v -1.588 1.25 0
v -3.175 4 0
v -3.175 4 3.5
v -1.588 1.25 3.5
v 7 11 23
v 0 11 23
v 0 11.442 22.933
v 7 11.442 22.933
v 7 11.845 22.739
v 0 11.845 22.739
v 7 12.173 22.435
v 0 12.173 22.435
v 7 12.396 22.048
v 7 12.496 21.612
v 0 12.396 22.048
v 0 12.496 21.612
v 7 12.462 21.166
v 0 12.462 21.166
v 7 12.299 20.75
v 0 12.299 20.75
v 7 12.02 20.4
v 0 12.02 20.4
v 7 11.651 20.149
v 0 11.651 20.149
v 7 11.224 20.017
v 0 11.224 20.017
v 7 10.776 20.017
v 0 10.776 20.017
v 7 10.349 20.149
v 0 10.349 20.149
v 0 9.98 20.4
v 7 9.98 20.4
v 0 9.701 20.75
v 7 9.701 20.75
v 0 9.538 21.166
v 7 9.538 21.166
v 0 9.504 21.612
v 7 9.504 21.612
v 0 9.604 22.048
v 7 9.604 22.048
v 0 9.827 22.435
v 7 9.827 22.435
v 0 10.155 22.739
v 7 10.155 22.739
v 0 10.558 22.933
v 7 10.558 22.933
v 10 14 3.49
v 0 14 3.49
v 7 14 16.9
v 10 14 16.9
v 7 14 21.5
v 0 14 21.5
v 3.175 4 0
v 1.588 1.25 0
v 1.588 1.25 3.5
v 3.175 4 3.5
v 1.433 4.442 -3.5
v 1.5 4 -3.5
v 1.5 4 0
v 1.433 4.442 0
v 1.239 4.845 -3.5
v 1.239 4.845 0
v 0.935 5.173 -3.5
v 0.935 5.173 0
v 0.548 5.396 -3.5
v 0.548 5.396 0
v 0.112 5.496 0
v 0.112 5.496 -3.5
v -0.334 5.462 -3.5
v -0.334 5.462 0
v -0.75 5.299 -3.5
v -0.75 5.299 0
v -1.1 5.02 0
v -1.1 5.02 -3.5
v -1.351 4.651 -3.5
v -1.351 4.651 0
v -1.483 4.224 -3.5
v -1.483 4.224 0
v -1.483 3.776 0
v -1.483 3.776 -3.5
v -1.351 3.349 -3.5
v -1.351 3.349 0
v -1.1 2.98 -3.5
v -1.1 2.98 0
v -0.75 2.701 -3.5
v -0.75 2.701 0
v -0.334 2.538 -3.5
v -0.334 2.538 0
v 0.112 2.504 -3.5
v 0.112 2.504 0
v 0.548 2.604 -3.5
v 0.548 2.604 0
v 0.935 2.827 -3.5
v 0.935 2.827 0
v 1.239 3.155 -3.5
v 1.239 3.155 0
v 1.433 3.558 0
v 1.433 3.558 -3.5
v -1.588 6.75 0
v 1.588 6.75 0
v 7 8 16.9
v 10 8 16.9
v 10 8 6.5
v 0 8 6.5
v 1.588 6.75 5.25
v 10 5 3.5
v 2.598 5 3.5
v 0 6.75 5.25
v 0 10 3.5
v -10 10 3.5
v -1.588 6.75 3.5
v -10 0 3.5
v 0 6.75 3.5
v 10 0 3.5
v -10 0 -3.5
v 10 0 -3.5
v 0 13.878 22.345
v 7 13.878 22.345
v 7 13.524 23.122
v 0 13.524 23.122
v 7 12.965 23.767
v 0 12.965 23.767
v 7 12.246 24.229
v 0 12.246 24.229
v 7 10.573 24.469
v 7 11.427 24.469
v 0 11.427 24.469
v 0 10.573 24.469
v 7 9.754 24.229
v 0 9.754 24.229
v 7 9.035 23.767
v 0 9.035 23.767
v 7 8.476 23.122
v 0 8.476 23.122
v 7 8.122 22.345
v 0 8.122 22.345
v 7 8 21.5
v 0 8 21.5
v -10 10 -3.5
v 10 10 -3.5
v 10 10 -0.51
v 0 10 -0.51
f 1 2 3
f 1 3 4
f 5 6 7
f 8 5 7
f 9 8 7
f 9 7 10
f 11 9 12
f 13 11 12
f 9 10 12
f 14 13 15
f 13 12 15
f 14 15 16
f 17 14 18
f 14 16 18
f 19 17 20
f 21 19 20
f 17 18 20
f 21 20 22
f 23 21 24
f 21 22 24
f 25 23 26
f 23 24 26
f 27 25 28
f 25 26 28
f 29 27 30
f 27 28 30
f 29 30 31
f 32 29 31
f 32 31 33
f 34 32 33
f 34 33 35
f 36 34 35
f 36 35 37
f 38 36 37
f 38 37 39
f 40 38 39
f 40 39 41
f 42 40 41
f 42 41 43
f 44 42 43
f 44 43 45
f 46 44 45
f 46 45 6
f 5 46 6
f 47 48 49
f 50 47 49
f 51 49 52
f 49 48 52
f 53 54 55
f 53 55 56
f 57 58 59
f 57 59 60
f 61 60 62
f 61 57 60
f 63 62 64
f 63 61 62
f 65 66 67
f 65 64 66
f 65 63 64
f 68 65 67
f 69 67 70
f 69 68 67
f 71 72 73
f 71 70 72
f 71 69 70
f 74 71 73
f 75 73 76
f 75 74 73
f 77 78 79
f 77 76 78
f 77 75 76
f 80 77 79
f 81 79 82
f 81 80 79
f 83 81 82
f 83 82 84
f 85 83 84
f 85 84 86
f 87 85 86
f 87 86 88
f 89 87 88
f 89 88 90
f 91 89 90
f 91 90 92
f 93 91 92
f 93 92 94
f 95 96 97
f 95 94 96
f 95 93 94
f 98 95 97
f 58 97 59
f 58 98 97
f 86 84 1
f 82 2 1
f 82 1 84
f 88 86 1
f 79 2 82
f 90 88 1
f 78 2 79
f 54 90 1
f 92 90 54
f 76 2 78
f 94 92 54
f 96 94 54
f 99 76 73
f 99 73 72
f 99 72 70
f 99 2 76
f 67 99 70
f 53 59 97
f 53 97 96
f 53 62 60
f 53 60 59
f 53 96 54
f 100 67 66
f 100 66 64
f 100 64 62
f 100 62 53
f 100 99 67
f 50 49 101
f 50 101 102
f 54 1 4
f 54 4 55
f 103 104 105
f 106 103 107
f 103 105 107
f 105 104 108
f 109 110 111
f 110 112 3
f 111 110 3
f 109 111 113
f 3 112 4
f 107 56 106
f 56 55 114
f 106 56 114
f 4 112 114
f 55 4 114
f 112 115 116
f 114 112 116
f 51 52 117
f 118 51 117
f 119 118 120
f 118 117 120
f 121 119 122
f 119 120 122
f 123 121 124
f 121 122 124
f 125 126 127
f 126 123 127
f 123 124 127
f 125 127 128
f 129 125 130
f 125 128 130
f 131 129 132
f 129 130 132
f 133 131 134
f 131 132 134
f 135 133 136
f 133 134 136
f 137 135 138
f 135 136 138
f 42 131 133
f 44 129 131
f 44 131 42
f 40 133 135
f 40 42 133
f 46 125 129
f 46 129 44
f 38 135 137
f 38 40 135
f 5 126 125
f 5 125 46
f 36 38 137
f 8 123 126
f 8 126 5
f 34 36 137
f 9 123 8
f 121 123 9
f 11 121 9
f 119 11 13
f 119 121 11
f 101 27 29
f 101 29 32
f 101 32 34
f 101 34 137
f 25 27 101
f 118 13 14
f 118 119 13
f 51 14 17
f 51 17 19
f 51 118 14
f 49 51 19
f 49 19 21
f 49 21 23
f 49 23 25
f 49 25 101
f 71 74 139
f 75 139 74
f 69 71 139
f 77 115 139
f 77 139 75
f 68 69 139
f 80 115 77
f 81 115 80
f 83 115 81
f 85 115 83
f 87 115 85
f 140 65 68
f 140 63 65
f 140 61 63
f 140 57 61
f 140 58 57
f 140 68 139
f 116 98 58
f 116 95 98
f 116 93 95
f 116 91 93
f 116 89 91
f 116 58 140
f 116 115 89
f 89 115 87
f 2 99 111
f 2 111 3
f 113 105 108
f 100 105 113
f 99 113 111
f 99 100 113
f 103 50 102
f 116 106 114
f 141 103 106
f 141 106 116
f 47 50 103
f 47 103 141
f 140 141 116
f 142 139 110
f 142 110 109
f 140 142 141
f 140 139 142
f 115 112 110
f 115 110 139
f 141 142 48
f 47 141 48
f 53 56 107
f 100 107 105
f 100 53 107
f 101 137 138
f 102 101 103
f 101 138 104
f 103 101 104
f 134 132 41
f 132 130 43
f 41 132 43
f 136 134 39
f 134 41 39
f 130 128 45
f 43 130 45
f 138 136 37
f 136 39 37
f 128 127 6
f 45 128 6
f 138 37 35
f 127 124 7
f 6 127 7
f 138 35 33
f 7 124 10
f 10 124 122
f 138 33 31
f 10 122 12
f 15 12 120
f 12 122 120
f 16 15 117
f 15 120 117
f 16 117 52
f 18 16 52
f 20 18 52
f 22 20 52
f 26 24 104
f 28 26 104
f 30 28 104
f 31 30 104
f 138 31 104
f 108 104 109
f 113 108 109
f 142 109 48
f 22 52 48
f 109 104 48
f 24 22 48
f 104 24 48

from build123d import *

# Parameters (mm, degrees)
ESQUISSE1_W                  = 20
ESQUISSE1_H                  = 7
BOSS_EXTRU_1_DEPTH           = 10
BOSS_EXTRU_2_DEPTH           = 10
ESQUISSE3_W                  = 3
ESQUISSE3_H                  = 9.2
ENL_V_MAT_EXTRU_1_DEPTH      = 30.93743476
ESQUISSE4_R                  = 1.5
ENL_V_MAT_EXTRU_2_DEPTH      = 30.93743476
ENL_V_MAT_EXTRU_4_DEPTH      = 28.147743921
ENL_V_MAT_EXTRU_4_DEPTH_BACK = 28.147743921
ESQUISSE7_R                  = 1.5
ENL_V_MAT_EXTRU_3_DEPTH      = 28.147743921
ENL_V_MAT_EXTRU_3_DEPTH_BACK = 3.5


with BuildPart() as part:
    # Esquisse1 → Boss.-Extru.1 (new body)
    with BuildSketch(Plane(origin=(0, 0, 0), x_dir=(1, 0, 0), z_dir=(0, 1, 0))):
        Rectangle(ESQUISSE1_W, ESQUISSE1_H)
    extrude(amount=BOSS_EXTRU_1_DEPTH)

    # Esquisse2 → Boss.-Extru.2 (add)
    with BuildSketch(Plane(origin=(0, 0, 0), x_dir=(0, 0, -1), z_dir=(1, 0, 0))):
        with BuildLine():
            Line((-3.5, 5), (-3.5, 10))
            Line((-3.5, 10), (0.510302645, 10))
            Line((0.510302645, 10), (-3.489697355, 14))
            Line((-3.489697355, 14), (-21.5, 14))
            ThreePointArc((-21.5, 14), (-24.5, 11), (-21.5, 8))
            Line((-21.5, 8), (-6.5, 8))
            Line((-6.5, 8), (-3.5, 5))
        make_face()
    extrude(amount=BOSS_EXTRU_2_DEPTH)

    # Esquisse3 → Enlèv. mat.-Extru.1 (cut, through all)
    with BuildSketch(Plane(origin=(0, 14, 0), x_dir=(1, 0, 0), z_dir=(0, 1, 0))):
        with Locations((8.5, -21.5)):
            Rectangle(ESQUISSE3_W, ESQUISSE3_H)
    extrude(amount=-ENL_V_MAT_EXTRU_1_DEPTH, mode=Mode.SUBTRACT)

    # Esquisse4 → Enlèv. mat.-Extru.2 (cut, through all)
    with BuildSketch(Plane.ZY):
        with Locations((21.5, 11)):
            Circle(ESQUISSE4_R)
    extrude(amount=-ENL_V_MAT_EXTRU_2_DEPTH, mode=Mode.SUBTRACT)

    # Esquisse7 → Enlèv. mat.-Extru.4 (cut, two sides: drawn at the far end of the back side and taken through both)
    with BuildSketch(Plane.XY.offset(3.5).offset(-ENL_V_MAT_EXTRU_4_DEPTH_BACK)):
        with Locations((0, 4)):
            Circle(ESQUISSE7_R)
    extrude(amount=ENL_V_MAT_EXTRU_4_DEPTH + ENL_V_MAT_EXTRU_4_DEPTH_BACK, mode=Mode.SUBTRACT)

    # Esquisse5 → Enlèv. mat.-Extru.3 (cut, two sides: drawn at the far end of the back side and taken through both)
    with BuildSketch(Plane.XY.offset(3.5).offset(-ENL_V_MAT_EXTRU_3_DEPTH_BACK)):
        Polygon((-1.58771324, 6.75), (-3.175426481, 4), (-1.58771324, 1.25), (1.58771324, 1.25), (3.175426481, 4), (1.58771324, 6.75), align=None)
    extrude(amount=ENL_V_MAT_EXTRU_3_DEPTH + ENL_V_MAT_EXTRU_3_DEPTH_BACK, mode=Mode.SUBTRACT)


solid = part.part
